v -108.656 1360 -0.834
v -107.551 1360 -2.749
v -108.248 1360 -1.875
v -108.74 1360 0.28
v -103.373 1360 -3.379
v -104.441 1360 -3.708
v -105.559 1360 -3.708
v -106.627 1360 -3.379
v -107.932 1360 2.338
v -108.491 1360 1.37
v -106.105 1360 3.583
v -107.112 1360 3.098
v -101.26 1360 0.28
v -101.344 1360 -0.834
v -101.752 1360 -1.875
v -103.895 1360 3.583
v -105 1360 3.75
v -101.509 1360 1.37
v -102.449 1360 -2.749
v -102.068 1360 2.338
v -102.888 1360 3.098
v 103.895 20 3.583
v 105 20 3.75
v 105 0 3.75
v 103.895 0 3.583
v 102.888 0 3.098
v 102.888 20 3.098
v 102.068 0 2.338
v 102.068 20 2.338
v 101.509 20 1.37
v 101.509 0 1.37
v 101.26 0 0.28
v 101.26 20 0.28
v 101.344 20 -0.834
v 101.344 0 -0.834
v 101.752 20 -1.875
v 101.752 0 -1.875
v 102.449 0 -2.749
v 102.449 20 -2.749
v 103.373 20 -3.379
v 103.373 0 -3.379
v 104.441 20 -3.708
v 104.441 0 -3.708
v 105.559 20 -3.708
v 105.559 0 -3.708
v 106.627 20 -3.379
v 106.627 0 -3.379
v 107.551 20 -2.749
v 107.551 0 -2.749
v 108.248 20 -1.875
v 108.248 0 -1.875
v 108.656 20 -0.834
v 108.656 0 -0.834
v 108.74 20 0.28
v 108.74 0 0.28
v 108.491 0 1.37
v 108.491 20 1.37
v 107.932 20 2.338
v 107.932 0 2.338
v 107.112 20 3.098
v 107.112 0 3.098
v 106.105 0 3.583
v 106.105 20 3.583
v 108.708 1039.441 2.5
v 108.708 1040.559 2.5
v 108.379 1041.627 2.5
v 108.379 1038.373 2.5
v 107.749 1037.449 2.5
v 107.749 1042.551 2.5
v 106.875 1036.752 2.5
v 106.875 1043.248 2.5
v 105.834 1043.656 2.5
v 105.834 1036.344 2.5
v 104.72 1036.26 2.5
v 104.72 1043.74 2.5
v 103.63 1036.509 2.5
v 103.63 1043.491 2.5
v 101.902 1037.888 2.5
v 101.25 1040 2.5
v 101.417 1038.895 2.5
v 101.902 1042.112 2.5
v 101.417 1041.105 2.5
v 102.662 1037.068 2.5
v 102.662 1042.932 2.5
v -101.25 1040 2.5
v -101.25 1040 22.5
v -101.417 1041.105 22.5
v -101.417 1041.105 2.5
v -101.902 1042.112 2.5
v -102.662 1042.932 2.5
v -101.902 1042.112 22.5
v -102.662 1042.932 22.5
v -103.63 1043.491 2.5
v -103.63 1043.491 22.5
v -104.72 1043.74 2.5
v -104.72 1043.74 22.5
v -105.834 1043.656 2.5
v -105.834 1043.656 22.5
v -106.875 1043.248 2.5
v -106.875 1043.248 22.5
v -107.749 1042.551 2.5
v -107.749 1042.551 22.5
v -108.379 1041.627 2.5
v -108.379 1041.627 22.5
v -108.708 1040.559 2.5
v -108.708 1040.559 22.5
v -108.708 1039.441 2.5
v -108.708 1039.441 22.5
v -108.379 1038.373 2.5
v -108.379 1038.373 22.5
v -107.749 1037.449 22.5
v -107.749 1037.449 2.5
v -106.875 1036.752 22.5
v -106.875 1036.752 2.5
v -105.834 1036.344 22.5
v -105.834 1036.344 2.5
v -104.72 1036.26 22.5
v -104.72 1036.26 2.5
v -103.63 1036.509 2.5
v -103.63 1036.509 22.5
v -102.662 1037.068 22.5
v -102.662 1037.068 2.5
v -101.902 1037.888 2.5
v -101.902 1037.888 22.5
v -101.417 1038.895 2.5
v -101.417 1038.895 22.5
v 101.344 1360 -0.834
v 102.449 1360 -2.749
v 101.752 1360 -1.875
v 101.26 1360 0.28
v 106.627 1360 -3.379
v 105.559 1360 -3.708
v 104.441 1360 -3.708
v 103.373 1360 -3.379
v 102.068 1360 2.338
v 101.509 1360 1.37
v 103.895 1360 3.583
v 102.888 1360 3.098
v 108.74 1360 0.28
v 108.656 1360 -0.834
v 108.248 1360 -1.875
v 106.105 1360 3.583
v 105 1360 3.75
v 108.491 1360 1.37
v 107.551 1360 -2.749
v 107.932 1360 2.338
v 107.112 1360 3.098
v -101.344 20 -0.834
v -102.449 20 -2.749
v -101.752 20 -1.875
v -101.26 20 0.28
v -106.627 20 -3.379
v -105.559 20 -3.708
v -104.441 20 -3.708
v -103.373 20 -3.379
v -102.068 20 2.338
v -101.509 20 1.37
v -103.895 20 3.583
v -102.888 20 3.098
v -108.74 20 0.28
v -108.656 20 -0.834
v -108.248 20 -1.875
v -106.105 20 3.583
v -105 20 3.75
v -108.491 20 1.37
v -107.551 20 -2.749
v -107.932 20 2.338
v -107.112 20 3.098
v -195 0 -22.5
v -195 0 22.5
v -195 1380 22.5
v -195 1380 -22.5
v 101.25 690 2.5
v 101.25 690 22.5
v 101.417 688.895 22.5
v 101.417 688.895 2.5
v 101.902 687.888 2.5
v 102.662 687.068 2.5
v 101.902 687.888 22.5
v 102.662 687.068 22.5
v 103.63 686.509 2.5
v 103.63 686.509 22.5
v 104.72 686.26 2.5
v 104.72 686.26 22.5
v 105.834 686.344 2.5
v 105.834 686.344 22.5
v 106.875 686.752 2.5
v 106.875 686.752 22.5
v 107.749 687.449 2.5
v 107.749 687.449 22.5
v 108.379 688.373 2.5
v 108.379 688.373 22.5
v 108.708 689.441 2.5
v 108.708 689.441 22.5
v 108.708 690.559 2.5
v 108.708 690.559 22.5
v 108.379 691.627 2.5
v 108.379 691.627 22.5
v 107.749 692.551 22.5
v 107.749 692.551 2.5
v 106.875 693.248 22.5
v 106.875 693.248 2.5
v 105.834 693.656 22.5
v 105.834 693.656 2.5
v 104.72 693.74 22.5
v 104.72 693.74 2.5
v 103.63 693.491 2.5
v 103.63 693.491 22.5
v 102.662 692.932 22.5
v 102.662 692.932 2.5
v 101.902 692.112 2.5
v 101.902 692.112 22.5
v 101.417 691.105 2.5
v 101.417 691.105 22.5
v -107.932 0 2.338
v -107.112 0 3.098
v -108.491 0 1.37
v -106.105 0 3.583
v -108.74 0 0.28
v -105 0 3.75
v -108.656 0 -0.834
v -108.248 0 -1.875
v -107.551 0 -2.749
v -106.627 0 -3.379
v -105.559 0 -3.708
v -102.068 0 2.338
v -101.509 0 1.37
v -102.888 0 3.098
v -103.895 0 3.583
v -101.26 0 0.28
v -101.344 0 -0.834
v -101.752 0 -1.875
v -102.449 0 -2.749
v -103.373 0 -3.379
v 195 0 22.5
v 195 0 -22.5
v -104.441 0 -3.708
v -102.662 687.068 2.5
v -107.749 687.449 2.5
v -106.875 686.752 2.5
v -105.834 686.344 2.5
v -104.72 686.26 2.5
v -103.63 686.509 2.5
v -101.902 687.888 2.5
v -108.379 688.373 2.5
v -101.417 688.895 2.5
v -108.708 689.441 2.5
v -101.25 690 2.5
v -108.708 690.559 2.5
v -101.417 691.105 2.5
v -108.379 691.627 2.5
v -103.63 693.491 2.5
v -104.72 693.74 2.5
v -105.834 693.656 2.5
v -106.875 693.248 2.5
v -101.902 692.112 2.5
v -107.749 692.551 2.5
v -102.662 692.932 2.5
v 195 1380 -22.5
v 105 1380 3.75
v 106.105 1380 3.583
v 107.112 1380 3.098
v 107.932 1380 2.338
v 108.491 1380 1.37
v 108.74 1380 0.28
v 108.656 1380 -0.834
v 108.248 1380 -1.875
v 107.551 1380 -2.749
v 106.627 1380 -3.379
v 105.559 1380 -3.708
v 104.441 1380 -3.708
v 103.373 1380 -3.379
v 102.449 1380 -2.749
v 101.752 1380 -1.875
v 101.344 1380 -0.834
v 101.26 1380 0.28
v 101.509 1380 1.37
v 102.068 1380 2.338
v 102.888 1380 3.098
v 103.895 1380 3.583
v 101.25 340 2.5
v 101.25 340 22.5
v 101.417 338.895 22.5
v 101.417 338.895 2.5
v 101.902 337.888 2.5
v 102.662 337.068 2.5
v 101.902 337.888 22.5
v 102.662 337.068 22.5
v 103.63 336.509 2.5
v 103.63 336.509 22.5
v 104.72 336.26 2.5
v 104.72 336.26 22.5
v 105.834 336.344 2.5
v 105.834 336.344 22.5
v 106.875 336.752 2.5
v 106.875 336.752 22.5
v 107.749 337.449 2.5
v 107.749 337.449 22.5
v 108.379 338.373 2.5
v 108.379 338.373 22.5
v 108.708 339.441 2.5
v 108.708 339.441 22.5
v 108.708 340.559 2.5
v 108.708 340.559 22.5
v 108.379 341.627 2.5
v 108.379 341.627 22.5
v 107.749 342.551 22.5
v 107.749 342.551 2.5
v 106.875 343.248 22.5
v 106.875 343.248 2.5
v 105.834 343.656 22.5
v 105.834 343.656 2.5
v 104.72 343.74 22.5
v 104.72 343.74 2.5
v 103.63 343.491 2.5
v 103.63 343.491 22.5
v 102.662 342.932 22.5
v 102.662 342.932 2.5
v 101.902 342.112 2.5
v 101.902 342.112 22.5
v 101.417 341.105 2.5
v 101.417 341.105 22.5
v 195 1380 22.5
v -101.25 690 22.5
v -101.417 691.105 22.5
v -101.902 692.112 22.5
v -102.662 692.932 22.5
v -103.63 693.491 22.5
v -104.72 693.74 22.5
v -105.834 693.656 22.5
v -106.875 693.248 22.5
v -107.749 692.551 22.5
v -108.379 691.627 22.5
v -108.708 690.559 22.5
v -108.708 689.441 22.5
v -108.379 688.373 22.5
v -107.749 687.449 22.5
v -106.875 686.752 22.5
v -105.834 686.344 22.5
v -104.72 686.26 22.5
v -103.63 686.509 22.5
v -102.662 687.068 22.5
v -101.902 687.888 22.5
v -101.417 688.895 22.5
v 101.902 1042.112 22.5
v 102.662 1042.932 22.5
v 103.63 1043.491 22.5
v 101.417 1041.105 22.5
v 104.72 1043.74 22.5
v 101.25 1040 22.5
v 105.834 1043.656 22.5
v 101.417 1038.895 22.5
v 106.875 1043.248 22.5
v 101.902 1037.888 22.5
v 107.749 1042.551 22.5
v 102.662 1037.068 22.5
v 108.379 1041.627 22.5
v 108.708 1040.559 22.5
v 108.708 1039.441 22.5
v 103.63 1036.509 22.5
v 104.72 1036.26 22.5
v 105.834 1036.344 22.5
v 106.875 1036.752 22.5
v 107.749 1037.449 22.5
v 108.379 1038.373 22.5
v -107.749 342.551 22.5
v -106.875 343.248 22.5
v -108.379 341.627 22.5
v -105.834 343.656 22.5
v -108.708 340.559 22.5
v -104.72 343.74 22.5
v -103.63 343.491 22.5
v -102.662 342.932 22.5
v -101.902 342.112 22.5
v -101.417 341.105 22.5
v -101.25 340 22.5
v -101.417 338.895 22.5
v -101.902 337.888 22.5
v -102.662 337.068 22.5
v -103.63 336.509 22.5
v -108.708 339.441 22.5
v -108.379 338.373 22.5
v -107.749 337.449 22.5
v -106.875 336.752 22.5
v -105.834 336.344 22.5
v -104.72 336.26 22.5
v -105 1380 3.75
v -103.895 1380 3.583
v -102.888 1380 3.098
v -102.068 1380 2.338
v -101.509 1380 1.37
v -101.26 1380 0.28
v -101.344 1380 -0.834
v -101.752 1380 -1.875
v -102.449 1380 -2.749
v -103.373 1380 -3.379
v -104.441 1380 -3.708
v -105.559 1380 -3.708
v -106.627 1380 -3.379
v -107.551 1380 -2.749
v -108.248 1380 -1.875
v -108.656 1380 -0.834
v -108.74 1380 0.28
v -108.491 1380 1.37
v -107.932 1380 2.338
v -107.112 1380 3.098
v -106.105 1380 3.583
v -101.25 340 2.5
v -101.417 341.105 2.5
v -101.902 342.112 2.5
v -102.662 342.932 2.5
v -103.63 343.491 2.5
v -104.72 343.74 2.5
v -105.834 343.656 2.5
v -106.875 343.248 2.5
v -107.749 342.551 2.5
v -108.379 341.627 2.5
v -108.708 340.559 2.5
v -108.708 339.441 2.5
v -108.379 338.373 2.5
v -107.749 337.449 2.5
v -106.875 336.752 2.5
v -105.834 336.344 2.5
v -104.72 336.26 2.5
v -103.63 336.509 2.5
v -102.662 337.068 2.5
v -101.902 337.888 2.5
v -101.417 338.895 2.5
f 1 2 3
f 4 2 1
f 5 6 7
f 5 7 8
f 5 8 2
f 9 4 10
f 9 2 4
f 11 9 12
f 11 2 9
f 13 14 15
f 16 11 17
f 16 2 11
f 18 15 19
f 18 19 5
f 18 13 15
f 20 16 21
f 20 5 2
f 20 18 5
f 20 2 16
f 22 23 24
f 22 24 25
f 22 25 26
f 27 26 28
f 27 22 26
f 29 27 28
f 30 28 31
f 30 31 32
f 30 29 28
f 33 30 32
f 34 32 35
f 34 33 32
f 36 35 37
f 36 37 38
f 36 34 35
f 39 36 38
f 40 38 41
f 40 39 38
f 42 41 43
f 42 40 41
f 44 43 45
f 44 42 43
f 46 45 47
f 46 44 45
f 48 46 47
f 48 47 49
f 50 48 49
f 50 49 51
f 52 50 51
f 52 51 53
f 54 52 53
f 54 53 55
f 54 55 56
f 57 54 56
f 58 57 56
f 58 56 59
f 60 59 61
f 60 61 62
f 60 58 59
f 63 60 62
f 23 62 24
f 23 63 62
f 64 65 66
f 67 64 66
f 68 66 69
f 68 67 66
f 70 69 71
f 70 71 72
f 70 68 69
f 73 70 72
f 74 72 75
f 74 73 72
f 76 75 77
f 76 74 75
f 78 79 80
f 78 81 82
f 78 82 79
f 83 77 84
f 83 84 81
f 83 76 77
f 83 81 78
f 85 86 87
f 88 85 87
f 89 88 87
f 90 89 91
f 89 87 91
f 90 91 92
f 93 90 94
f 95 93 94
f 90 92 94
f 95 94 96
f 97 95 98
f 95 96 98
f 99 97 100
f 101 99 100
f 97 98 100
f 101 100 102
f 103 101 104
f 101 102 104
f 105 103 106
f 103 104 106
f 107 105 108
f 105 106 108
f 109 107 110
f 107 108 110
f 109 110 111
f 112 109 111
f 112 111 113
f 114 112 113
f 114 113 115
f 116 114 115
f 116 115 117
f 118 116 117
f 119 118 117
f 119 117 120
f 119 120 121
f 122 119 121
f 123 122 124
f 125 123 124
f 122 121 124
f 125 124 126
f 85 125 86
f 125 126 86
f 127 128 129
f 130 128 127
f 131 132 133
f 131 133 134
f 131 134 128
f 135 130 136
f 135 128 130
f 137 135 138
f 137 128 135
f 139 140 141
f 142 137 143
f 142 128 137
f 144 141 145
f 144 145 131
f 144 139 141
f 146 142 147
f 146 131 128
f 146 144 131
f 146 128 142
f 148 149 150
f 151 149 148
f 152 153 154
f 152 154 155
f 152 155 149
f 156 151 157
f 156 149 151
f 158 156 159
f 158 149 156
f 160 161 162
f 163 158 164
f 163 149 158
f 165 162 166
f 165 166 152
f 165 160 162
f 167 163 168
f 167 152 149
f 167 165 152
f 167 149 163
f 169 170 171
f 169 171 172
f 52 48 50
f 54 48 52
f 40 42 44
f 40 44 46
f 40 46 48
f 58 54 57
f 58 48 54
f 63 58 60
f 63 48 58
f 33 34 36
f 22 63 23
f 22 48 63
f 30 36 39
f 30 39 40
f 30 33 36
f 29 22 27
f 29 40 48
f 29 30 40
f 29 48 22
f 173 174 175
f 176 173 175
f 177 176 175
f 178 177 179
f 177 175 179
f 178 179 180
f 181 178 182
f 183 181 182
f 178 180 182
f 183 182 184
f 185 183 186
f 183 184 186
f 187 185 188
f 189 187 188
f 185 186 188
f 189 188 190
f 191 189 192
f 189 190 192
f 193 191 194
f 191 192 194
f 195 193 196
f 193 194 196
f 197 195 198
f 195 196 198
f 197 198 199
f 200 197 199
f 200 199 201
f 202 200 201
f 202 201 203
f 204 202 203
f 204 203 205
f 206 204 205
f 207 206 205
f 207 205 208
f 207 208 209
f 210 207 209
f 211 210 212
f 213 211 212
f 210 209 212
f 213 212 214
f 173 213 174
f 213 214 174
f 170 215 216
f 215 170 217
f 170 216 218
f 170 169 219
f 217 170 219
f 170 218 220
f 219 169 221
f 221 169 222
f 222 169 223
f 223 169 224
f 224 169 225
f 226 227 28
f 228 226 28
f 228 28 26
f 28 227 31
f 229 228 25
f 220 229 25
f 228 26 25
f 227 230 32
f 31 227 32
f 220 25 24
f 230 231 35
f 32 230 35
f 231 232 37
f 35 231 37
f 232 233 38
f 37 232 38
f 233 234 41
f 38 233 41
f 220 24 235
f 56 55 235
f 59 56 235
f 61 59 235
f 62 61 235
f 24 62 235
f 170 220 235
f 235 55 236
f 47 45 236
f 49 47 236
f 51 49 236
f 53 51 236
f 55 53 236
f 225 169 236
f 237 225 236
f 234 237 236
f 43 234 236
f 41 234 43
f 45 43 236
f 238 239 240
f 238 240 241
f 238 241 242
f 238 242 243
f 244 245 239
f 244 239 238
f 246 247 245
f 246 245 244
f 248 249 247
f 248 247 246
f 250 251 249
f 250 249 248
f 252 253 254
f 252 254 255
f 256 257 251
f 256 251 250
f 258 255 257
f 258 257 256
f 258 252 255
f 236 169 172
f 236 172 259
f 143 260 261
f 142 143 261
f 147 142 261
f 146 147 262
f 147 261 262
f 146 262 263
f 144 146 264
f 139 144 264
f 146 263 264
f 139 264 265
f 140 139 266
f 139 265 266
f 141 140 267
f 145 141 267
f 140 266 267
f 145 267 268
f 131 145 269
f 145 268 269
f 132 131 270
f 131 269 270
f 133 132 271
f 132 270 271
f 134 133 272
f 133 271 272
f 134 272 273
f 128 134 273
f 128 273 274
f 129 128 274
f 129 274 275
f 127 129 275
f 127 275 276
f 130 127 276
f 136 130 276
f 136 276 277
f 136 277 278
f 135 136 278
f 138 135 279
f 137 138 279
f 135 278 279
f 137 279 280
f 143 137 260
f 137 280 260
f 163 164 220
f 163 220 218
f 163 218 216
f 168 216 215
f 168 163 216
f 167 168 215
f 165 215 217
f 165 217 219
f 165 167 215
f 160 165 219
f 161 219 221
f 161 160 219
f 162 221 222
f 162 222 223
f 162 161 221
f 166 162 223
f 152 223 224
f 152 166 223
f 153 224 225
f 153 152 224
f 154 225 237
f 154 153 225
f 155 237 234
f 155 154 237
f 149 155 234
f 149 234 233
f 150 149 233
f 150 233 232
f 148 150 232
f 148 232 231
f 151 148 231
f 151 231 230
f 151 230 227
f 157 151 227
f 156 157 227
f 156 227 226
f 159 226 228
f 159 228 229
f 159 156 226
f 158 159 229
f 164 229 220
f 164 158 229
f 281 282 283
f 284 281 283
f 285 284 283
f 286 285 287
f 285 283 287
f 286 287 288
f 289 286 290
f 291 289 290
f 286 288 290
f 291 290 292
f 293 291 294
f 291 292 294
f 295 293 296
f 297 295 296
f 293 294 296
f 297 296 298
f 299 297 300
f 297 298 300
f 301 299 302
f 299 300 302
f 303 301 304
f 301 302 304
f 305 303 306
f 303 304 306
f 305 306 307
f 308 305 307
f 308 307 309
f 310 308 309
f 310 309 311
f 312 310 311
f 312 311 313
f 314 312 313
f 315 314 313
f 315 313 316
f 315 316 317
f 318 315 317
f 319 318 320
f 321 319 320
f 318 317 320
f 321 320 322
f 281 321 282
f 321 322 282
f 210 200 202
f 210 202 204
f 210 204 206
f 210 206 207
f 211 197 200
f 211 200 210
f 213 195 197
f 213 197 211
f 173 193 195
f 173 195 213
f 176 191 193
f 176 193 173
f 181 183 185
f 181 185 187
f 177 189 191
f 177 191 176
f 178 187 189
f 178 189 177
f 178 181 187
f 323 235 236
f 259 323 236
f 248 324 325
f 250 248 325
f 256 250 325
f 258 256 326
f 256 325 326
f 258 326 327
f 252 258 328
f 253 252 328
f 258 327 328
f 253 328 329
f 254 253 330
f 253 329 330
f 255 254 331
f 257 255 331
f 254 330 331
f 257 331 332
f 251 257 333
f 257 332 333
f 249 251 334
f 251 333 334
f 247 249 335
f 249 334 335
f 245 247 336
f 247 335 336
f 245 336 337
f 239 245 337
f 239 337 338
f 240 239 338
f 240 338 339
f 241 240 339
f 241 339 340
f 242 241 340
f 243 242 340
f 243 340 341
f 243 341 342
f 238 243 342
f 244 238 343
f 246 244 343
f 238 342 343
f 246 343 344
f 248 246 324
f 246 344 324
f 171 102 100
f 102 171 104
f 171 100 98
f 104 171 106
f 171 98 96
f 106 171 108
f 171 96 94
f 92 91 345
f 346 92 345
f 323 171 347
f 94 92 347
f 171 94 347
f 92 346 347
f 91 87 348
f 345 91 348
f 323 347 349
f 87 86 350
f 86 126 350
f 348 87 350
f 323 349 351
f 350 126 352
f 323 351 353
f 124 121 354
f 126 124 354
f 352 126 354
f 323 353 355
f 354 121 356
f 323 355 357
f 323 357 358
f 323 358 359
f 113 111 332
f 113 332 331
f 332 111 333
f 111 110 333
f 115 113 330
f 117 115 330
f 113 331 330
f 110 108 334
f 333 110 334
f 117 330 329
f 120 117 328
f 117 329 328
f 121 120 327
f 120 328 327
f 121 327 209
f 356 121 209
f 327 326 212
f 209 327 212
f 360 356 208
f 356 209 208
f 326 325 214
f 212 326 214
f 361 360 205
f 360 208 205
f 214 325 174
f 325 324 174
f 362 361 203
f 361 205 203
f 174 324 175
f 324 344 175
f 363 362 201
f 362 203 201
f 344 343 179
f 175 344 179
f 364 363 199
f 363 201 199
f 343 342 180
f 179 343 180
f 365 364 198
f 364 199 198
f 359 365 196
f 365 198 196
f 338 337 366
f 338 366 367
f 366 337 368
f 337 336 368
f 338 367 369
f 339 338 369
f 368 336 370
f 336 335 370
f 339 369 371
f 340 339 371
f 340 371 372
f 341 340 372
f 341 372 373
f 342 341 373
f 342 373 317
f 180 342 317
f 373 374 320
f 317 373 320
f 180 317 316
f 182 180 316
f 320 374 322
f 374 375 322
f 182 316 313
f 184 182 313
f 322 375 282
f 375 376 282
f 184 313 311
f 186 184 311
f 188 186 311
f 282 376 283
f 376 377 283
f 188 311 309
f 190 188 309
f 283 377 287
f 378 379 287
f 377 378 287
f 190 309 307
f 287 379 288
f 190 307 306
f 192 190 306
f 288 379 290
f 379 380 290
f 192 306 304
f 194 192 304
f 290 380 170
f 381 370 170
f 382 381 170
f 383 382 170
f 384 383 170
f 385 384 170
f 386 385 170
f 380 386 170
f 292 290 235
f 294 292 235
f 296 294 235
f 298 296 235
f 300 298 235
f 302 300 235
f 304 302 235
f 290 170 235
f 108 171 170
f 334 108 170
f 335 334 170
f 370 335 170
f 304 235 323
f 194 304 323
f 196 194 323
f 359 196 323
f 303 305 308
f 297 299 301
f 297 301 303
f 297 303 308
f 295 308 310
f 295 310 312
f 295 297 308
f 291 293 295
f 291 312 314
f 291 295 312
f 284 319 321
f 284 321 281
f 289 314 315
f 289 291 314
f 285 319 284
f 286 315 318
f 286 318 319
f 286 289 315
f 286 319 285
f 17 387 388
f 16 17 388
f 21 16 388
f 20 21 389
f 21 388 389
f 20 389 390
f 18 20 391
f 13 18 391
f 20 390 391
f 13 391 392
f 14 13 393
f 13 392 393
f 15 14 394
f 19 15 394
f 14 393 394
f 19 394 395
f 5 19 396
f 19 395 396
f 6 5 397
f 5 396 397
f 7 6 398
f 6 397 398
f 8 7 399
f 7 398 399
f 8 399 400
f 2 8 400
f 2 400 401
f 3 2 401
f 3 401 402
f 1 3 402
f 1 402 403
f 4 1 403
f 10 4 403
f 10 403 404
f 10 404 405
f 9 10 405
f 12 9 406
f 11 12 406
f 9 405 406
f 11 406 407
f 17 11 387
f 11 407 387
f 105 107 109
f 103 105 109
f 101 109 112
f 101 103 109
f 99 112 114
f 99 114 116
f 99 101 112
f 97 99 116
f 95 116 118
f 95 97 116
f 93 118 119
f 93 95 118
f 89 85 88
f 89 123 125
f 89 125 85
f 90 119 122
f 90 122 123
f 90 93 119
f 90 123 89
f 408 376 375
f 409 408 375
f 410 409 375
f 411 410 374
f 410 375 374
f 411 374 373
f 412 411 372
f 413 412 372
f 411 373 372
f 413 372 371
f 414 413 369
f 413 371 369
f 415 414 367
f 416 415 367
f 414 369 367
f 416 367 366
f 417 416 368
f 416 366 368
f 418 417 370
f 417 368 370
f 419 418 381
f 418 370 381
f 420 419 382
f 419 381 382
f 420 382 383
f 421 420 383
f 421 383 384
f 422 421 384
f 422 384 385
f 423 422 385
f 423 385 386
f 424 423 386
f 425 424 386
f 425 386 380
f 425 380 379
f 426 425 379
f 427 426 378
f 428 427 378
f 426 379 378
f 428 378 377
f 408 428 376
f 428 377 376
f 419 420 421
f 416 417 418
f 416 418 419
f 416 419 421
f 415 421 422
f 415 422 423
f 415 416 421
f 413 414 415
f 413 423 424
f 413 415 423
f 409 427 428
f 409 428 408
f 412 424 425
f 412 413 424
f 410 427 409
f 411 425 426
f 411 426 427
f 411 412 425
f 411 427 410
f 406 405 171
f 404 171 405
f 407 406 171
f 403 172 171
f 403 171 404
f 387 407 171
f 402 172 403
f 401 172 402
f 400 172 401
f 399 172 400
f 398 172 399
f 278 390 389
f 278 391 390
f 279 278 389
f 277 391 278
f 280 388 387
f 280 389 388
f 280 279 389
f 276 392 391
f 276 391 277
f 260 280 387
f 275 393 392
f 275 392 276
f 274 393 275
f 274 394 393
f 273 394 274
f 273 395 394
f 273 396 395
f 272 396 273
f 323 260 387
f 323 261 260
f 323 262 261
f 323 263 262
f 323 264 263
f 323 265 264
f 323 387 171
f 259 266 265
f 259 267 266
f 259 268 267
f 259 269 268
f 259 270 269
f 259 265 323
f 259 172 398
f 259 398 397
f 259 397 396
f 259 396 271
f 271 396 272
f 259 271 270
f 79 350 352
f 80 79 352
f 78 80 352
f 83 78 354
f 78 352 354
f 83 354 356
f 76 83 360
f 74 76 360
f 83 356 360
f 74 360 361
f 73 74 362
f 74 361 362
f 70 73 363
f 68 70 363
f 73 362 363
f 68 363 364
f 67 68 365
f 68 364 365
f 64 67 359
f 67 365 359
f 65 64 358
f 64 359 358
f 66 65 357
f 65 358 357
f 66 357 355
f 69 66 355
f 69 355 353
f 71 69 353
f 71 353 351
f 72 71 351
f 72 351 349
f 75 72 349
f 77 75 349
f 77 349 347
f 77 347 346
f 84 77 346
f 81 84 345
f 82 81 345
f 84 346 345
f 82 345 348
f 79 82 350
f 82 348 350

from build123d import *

# Parameters (mm, degrees)
ESQUISSE1_W             = 390
ESQUISSE1_H             = 45
BOSS_EXTRU_1_DEPTH      = 1380
ESQUISSE2_R             = 3.75
ENL_V_MAT_EXTRU_1_DEPTH = 20
ESQUISSE3_R             = 3.75
ENL_V_MAT_EXTRU_2_DEPTH = 20
ENL_V_START             = -20
ESQUISSE4_R             = 3.75
ENL_V_MAT_EXTRU_3_DEPTH = 20


with BuildPart() as part:
    # Esquisse1 → Boss.-Extru.1 (new body)
    with BuildSketch(Plane(origin=(0, 0, 0), x_dir=(1, 0, 0), z_dir=(0, 1, 0))):
        Rectangle(ESQUISSE1_W, ESQUISSE1_H)
    extrude(amount=BOSS_EXTRU_1_DEPTH)

    # Esquisse2 → Enlèv. mat.-Extru.1 (cut)
    with BuildSketch(Plane.XY.offset(22.5)):
        with Locations((-105, 1040)):
            Circle(ESQUISSE2_R)
        with Locations(Location((105, 1040, 0), (0, 0, 180))):
            Circle(ESQUISSE2_R)
        with Locations((-105, 690)):
            Circle(ESQUISSE2_R)
        with Locations((-105, 340)):
            Circle(ESQUISSE2_R)
        with Locations(Location((105, 340, 0), (0, 0, 180))):
            Circle(ESQUISSE2_R)
        with Locations(Location((105, 690, 0), (0, 0, 180))):
            Circle(ESQUISSE2_R)
    extrude(amount=-ENL_V_MAT_EXTRU_1_DEPTH, mode=Mode.SUBTRACT)

    # Esquisse3 → Enlèv. mat.-Extru.2 (cut)
    with BuildSketch(Plane(origin=(0, 1380, 0), x_dir=(1, 0, 0), z_dir=(0, 1, 0))):
        with Locations(Location((-105, 0, 0), (0, 0, 270))):
            Circle(ESQUISSE3_R)
        with Locations(Location((105, 0, 0), (0, 0, 270))):
            Circle(ESQUISSE3_R)
    extrude(amount=-ENL_V_MAT_EXTRU_2_DEPTH, mode=Mode.SUBTRACT)

    # Esquisse4 → Enlèv. mat.-Extru.3 (cut)
    with BuildSketch(Plane.XZ.offset(ENL_V_START)):
        with Locations(Location((-105, 0, 0), (0, 0, 90))):
            Circle(ESQUISSE4_R)
        with Locations(Location((105, 0, 0), (0, 0, 90))):
            Circle(ESQUISSE4_R)
    extrude(amount=ENL_V_MAT_EXTRU_3_DEPTH, mode=Mode.SUBTRACT)


solid = part.part
